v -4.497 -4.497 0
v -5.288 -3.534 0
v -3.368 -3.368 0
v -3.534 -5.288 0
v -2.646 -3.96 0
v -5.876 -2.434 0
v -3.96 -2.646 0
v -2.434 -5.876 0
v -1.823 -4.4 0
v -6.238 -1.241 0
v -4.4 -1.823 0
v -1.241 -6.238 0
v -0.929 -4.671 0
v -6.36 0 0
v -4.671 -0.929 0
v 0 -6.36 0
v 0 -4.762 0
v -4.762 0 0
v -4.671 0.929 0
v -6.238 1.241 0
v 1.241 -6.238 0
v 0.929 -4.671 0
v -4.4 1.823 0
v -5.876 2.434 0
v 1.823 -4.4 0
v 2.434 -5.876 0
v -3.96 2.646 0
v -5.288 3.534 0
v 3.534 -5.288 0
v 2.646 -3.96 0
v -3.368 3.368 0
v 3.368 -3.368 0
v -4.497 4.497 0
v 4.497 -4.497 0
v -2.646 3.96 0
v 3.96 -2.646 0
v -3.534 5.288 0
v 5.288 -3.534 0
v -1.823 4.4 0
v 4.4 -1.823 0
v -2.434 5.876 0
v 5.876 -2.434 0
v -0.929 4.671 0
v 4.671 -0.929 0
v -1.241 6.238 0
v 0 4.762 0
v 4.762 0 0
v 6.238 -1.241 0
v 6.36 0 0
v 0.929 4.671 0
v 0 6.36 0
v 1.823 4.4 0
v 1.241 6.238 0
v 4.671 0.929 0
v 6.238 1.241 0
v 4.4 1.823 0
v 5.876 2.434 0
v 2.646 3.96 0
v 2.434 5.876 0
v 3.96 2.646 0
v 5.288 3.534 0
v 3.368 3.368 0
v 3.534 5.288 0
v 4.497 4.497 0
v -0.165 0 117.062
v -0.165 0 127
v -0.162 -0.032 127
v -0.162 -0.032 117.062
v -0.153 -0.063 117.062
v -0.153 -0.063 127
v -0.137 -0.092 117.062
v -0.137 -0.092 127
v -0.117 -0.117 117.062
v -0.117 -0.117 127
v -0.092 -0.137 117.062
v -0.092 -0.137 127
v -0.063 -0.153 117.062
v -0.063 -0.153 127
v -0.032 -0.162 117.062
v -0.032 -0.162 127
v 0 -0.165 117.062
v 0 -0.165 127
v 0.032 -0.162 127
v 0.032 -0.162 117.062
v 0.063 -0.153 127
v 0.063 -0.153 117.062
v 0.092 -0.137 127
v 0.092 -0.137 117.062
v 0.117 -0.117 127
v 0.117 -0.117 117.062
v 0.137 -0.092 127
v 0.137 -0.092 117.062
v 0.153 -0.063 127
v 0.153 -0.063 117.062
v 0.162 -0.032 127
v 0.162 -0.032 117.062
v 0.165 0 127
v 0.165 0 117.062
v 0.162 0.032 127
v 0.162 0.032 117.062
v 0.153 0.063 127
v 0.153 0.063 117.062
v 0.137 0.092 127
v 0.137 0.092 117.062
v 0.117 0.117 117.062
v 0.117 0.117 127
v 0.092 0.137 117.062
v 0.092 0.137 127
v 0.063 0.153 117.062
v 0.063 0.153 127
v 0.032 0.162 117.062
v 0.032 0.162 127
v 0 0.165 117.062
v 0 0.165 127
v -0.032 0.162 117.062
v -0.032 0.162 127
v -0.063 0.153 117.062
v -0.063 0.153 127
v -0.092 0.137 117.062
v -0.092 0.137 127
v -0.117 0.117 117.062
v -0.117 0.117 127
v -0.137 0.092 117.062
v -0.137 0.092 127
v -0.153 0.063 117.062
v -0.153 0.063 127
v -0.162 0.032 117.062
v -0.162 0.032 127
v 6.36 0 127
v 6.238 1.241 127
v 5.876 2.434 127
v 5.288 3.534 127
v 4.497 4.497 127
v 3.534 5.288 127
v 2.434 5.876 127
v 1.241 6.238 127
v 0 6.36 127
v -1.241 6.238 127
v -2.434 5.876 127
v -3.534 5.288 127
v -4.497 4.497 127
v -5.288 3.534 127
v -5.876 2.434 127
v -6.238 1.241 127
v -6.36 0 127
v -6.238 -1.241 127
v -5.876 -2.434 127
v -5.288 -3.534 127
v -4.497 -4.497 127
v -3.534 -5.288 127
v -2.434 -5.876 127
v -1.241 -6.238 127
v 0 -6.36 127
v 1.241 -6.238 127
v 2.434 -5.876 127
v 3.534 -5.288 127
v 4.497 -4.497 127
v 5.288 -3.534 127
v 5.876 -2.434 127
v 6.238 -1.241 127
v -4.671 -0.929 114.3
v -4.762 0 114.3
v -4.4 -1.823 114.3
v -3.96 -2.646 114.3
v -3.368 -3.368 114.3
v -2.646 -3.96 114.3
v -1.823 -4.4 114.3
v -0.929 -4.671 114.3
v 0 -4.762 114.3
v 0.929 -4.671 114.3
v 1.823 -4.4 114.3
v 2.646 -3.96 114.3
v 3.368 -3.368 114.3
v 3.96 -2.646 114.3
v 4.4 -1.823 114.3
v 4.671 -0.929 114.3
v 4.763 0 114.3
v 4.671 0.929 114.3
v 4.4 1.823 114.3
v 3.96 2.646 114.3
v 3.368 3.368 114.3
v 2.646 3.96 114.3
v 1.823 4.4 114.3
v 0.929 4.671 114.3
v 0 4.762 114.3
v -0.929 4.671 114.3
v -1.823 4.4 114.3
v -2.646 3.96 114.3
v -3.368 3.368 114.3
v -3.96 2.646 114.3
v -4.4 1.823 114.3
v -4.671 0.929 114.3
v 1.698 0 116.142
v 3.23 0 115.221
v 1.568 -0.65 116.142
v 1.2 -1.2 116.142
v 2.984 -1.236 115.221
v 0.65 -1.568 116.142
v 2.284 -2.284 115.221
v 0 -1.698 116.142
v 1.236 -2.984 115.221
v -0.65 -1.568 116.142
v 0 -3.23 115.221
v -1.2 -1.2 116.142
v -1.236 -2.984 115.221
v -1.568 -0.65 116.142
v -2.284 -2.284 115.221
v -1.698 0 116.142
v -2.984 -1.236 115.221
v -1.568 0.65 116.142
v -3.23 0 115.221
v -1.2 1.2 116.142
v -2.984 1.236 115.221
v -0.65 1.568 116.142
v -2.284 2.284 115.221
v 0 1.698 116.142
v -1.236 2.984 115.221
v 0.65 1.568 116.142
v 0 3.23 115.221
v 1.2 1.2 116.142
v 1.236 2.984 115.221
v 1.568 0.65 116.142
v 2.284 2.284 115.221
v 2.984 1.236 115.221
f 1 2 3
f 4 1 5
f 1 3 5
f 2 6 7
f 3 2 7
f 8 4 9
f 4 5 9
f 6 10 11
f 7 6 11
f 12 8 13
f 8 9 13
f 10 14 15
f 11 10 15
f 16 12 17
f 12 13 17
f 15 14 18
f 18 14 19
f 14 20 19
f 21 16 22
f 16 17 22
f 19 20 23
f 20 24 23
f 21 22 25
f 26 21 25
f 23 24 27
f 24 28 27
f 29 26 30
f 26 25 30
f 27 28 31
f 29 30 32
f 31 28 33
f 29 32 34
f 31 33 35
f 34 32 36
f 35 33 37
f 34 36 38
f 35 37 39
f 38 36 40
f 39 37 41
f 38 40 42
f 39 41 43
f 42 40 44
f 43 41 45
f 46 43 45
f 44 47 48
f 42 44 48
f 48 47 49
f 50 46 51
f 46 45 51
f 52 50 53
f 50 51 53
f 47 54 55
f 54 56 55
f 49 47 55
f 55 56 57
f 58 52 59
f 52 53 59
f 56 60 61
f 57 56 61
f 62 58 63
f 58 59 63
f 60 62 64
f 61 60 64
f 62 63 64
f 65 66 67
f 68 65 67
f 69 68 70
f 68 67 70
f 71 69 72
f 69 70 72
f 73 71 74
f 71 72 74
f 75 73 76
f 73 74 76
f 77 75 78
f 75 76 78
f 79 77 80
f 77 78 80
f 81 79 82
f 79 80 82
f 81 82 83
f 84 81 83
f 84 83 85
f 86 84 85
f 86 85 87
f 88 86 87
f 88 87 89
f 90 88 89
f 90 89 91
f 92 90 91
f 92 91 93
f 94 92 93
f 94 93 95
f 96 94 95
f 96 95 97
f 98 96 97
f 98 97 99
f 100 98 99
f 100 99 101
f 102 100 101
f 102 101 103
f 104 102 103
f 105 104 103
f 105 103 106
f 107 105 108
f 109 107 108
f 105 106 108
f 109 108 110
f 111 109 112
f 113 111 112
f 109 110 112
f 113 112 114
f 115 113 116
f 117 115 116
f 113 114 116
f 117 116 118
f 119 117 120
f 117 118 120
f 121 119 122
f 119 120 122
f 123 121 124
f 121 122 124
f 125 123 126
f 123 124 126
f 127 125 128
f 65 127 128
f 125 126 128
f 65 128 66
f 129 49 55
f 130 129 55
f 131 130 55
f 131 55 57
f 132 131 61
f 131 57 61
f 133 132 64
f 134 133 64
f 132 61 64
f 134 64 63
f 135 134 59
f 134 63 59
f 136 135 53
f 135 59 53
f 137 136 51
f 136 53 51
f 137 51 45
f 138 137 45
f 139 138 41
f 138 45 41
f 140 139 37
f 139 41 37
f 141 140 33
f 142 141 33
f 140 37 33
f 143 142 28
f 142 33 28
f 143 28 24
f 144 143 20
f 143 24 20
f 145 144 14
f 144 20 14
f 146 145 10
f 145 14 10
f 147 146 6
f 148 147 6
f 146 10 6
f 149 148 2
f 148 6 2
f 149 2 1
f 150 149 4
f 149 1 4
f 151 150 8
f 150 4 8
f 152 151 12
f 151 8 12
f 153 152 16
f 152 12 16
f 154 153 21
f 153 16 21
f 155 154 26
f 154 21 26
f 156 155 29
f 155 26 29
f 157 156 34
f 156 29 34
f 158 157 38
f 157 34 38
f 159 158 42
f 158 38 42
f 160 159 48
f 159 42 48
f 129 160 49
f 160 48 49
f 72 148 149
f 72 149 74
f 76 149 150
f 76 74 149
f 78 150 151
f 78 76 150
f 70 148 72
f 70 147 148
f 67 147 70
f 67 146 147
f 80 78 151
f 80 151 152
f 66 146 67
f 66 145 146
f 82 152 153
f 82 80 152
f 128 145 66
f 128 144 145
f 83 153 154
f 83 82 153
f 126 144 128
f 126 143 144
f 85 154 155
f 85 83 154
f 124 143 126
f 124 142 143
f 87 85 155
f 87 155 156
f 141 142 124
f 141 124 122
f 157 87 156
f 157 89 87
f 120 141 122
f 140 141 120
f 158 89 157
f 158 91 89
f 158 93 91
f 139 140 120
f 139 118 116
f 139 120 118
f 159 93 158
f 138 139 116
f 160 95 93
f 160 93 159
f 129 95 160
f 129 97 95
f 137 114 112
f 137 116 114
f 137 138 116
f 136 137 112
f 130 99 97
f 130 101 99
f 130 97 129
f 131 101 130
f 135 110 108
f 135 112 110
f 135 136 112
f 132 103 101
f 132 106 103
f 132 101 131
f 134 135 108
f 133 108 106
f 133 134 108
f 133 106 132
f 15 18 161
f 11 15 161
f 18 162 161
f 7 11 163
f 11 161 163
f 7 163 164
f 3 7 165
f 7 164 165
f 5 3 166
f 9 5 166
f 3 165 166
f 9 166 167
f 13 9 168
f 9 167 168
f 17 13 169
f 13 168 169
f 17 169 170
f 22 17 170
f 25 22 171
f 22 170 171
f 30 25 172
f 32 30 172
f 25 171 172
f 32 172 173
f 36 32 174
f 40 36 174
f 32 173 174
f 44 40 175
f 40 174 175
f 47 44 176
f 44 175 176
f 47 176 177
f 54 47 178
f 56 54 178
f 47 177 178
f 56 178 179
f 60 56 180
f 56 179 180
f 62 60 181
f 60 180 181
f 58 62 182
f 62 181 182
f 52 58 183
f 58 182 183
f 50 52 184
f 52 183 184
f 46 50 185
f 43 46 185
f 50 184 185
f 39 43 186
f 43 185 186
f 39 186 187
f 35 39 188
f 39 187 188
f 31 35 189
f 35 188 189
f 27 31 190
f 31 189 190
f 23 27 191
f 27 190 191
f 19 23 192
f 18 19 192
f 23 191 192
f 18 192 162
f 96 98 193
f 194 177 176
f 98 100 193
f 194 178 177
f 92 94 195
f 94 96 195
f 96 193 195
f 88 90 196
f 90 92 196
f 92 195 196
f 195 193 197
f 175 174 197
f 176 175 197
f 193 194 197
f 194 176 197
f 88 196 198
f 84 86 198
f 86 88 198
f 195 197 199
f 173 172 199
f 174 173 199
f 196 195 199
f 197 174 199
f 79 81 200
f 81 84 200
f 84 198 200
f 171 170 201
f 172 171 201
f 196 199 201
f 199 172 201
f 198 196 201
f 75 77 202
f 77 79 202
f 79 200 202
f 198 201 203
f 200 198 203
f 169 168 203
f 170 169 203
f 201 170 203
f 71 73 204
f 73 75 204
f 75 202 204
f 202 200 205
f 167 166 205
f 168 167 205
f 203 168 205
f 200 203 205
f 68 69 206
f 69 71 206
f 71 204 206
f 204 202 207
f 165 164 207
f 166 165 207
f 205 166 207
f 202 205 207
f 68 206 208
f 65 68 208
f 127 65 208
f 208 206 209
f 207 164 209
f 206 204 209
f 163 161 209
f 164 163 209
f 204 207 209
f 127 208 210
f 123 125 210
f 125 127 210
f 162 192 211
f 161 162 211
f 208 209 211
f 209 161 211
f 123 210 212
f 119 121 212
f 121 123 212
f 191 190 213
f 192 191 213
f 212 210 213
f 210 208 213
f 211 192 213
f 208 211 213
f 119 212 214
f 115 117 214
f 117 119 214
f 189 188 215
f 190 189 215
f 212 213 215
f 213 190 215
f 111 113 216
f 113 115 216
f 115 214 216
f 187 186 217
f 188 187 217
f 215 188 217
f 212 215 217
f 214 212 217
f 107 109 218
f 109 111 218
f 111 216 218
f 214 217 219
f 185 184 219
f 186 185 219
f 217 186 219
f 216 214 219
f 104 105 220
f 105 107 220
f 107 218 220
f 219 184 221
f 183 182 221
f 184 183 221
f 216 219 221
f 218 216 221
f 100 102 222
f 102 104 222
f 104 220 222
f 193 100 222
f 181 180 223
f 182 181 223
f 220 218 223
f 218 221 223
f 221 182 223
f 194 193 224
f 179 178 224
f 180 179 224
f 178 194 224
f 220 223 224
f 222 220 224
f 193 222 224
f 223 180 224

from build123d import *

# Parameters (mm, degrees)
F0_R     = 6.3603951
F1_DEPTH = 127
F2_D     = 9.525
F2_DEPTH = 114.3
F2_TIP   = 2.8615986981
F3_D     = 0.3302


with BuildPart() as f1:
    # F0 (on Top) → F1 (new body)
    with BuildSketch(Plane.XY):
        Circle(F0_R)
    extrude(amount=F1_DEPTH)

    # F2
    with Locations(Plane(origin=(0, 0, 0), x_dir=(1, 0, 0), z_dir=(0, 0, -1))):
        with Locations((0, 0)):
            Hole(F2_D / 2, depth=F2_DEPTH)
            with Locations((0, 0, -(F2_DEPTH + F2_TIP / 2))):  # 118° drill point
                Cone(0, F2_D / 2, F2_TIP, mode=Mode.SUBTRACT)

    # F3 (through all)
    with Locations(Plane(origin=(0, 0, 0), x_dir=(1, 0, 0), z_dir=(0, 0, -1))):
        with Locations((0, 0)):
            Hole(F3_D / 2)


solid = f1.part
